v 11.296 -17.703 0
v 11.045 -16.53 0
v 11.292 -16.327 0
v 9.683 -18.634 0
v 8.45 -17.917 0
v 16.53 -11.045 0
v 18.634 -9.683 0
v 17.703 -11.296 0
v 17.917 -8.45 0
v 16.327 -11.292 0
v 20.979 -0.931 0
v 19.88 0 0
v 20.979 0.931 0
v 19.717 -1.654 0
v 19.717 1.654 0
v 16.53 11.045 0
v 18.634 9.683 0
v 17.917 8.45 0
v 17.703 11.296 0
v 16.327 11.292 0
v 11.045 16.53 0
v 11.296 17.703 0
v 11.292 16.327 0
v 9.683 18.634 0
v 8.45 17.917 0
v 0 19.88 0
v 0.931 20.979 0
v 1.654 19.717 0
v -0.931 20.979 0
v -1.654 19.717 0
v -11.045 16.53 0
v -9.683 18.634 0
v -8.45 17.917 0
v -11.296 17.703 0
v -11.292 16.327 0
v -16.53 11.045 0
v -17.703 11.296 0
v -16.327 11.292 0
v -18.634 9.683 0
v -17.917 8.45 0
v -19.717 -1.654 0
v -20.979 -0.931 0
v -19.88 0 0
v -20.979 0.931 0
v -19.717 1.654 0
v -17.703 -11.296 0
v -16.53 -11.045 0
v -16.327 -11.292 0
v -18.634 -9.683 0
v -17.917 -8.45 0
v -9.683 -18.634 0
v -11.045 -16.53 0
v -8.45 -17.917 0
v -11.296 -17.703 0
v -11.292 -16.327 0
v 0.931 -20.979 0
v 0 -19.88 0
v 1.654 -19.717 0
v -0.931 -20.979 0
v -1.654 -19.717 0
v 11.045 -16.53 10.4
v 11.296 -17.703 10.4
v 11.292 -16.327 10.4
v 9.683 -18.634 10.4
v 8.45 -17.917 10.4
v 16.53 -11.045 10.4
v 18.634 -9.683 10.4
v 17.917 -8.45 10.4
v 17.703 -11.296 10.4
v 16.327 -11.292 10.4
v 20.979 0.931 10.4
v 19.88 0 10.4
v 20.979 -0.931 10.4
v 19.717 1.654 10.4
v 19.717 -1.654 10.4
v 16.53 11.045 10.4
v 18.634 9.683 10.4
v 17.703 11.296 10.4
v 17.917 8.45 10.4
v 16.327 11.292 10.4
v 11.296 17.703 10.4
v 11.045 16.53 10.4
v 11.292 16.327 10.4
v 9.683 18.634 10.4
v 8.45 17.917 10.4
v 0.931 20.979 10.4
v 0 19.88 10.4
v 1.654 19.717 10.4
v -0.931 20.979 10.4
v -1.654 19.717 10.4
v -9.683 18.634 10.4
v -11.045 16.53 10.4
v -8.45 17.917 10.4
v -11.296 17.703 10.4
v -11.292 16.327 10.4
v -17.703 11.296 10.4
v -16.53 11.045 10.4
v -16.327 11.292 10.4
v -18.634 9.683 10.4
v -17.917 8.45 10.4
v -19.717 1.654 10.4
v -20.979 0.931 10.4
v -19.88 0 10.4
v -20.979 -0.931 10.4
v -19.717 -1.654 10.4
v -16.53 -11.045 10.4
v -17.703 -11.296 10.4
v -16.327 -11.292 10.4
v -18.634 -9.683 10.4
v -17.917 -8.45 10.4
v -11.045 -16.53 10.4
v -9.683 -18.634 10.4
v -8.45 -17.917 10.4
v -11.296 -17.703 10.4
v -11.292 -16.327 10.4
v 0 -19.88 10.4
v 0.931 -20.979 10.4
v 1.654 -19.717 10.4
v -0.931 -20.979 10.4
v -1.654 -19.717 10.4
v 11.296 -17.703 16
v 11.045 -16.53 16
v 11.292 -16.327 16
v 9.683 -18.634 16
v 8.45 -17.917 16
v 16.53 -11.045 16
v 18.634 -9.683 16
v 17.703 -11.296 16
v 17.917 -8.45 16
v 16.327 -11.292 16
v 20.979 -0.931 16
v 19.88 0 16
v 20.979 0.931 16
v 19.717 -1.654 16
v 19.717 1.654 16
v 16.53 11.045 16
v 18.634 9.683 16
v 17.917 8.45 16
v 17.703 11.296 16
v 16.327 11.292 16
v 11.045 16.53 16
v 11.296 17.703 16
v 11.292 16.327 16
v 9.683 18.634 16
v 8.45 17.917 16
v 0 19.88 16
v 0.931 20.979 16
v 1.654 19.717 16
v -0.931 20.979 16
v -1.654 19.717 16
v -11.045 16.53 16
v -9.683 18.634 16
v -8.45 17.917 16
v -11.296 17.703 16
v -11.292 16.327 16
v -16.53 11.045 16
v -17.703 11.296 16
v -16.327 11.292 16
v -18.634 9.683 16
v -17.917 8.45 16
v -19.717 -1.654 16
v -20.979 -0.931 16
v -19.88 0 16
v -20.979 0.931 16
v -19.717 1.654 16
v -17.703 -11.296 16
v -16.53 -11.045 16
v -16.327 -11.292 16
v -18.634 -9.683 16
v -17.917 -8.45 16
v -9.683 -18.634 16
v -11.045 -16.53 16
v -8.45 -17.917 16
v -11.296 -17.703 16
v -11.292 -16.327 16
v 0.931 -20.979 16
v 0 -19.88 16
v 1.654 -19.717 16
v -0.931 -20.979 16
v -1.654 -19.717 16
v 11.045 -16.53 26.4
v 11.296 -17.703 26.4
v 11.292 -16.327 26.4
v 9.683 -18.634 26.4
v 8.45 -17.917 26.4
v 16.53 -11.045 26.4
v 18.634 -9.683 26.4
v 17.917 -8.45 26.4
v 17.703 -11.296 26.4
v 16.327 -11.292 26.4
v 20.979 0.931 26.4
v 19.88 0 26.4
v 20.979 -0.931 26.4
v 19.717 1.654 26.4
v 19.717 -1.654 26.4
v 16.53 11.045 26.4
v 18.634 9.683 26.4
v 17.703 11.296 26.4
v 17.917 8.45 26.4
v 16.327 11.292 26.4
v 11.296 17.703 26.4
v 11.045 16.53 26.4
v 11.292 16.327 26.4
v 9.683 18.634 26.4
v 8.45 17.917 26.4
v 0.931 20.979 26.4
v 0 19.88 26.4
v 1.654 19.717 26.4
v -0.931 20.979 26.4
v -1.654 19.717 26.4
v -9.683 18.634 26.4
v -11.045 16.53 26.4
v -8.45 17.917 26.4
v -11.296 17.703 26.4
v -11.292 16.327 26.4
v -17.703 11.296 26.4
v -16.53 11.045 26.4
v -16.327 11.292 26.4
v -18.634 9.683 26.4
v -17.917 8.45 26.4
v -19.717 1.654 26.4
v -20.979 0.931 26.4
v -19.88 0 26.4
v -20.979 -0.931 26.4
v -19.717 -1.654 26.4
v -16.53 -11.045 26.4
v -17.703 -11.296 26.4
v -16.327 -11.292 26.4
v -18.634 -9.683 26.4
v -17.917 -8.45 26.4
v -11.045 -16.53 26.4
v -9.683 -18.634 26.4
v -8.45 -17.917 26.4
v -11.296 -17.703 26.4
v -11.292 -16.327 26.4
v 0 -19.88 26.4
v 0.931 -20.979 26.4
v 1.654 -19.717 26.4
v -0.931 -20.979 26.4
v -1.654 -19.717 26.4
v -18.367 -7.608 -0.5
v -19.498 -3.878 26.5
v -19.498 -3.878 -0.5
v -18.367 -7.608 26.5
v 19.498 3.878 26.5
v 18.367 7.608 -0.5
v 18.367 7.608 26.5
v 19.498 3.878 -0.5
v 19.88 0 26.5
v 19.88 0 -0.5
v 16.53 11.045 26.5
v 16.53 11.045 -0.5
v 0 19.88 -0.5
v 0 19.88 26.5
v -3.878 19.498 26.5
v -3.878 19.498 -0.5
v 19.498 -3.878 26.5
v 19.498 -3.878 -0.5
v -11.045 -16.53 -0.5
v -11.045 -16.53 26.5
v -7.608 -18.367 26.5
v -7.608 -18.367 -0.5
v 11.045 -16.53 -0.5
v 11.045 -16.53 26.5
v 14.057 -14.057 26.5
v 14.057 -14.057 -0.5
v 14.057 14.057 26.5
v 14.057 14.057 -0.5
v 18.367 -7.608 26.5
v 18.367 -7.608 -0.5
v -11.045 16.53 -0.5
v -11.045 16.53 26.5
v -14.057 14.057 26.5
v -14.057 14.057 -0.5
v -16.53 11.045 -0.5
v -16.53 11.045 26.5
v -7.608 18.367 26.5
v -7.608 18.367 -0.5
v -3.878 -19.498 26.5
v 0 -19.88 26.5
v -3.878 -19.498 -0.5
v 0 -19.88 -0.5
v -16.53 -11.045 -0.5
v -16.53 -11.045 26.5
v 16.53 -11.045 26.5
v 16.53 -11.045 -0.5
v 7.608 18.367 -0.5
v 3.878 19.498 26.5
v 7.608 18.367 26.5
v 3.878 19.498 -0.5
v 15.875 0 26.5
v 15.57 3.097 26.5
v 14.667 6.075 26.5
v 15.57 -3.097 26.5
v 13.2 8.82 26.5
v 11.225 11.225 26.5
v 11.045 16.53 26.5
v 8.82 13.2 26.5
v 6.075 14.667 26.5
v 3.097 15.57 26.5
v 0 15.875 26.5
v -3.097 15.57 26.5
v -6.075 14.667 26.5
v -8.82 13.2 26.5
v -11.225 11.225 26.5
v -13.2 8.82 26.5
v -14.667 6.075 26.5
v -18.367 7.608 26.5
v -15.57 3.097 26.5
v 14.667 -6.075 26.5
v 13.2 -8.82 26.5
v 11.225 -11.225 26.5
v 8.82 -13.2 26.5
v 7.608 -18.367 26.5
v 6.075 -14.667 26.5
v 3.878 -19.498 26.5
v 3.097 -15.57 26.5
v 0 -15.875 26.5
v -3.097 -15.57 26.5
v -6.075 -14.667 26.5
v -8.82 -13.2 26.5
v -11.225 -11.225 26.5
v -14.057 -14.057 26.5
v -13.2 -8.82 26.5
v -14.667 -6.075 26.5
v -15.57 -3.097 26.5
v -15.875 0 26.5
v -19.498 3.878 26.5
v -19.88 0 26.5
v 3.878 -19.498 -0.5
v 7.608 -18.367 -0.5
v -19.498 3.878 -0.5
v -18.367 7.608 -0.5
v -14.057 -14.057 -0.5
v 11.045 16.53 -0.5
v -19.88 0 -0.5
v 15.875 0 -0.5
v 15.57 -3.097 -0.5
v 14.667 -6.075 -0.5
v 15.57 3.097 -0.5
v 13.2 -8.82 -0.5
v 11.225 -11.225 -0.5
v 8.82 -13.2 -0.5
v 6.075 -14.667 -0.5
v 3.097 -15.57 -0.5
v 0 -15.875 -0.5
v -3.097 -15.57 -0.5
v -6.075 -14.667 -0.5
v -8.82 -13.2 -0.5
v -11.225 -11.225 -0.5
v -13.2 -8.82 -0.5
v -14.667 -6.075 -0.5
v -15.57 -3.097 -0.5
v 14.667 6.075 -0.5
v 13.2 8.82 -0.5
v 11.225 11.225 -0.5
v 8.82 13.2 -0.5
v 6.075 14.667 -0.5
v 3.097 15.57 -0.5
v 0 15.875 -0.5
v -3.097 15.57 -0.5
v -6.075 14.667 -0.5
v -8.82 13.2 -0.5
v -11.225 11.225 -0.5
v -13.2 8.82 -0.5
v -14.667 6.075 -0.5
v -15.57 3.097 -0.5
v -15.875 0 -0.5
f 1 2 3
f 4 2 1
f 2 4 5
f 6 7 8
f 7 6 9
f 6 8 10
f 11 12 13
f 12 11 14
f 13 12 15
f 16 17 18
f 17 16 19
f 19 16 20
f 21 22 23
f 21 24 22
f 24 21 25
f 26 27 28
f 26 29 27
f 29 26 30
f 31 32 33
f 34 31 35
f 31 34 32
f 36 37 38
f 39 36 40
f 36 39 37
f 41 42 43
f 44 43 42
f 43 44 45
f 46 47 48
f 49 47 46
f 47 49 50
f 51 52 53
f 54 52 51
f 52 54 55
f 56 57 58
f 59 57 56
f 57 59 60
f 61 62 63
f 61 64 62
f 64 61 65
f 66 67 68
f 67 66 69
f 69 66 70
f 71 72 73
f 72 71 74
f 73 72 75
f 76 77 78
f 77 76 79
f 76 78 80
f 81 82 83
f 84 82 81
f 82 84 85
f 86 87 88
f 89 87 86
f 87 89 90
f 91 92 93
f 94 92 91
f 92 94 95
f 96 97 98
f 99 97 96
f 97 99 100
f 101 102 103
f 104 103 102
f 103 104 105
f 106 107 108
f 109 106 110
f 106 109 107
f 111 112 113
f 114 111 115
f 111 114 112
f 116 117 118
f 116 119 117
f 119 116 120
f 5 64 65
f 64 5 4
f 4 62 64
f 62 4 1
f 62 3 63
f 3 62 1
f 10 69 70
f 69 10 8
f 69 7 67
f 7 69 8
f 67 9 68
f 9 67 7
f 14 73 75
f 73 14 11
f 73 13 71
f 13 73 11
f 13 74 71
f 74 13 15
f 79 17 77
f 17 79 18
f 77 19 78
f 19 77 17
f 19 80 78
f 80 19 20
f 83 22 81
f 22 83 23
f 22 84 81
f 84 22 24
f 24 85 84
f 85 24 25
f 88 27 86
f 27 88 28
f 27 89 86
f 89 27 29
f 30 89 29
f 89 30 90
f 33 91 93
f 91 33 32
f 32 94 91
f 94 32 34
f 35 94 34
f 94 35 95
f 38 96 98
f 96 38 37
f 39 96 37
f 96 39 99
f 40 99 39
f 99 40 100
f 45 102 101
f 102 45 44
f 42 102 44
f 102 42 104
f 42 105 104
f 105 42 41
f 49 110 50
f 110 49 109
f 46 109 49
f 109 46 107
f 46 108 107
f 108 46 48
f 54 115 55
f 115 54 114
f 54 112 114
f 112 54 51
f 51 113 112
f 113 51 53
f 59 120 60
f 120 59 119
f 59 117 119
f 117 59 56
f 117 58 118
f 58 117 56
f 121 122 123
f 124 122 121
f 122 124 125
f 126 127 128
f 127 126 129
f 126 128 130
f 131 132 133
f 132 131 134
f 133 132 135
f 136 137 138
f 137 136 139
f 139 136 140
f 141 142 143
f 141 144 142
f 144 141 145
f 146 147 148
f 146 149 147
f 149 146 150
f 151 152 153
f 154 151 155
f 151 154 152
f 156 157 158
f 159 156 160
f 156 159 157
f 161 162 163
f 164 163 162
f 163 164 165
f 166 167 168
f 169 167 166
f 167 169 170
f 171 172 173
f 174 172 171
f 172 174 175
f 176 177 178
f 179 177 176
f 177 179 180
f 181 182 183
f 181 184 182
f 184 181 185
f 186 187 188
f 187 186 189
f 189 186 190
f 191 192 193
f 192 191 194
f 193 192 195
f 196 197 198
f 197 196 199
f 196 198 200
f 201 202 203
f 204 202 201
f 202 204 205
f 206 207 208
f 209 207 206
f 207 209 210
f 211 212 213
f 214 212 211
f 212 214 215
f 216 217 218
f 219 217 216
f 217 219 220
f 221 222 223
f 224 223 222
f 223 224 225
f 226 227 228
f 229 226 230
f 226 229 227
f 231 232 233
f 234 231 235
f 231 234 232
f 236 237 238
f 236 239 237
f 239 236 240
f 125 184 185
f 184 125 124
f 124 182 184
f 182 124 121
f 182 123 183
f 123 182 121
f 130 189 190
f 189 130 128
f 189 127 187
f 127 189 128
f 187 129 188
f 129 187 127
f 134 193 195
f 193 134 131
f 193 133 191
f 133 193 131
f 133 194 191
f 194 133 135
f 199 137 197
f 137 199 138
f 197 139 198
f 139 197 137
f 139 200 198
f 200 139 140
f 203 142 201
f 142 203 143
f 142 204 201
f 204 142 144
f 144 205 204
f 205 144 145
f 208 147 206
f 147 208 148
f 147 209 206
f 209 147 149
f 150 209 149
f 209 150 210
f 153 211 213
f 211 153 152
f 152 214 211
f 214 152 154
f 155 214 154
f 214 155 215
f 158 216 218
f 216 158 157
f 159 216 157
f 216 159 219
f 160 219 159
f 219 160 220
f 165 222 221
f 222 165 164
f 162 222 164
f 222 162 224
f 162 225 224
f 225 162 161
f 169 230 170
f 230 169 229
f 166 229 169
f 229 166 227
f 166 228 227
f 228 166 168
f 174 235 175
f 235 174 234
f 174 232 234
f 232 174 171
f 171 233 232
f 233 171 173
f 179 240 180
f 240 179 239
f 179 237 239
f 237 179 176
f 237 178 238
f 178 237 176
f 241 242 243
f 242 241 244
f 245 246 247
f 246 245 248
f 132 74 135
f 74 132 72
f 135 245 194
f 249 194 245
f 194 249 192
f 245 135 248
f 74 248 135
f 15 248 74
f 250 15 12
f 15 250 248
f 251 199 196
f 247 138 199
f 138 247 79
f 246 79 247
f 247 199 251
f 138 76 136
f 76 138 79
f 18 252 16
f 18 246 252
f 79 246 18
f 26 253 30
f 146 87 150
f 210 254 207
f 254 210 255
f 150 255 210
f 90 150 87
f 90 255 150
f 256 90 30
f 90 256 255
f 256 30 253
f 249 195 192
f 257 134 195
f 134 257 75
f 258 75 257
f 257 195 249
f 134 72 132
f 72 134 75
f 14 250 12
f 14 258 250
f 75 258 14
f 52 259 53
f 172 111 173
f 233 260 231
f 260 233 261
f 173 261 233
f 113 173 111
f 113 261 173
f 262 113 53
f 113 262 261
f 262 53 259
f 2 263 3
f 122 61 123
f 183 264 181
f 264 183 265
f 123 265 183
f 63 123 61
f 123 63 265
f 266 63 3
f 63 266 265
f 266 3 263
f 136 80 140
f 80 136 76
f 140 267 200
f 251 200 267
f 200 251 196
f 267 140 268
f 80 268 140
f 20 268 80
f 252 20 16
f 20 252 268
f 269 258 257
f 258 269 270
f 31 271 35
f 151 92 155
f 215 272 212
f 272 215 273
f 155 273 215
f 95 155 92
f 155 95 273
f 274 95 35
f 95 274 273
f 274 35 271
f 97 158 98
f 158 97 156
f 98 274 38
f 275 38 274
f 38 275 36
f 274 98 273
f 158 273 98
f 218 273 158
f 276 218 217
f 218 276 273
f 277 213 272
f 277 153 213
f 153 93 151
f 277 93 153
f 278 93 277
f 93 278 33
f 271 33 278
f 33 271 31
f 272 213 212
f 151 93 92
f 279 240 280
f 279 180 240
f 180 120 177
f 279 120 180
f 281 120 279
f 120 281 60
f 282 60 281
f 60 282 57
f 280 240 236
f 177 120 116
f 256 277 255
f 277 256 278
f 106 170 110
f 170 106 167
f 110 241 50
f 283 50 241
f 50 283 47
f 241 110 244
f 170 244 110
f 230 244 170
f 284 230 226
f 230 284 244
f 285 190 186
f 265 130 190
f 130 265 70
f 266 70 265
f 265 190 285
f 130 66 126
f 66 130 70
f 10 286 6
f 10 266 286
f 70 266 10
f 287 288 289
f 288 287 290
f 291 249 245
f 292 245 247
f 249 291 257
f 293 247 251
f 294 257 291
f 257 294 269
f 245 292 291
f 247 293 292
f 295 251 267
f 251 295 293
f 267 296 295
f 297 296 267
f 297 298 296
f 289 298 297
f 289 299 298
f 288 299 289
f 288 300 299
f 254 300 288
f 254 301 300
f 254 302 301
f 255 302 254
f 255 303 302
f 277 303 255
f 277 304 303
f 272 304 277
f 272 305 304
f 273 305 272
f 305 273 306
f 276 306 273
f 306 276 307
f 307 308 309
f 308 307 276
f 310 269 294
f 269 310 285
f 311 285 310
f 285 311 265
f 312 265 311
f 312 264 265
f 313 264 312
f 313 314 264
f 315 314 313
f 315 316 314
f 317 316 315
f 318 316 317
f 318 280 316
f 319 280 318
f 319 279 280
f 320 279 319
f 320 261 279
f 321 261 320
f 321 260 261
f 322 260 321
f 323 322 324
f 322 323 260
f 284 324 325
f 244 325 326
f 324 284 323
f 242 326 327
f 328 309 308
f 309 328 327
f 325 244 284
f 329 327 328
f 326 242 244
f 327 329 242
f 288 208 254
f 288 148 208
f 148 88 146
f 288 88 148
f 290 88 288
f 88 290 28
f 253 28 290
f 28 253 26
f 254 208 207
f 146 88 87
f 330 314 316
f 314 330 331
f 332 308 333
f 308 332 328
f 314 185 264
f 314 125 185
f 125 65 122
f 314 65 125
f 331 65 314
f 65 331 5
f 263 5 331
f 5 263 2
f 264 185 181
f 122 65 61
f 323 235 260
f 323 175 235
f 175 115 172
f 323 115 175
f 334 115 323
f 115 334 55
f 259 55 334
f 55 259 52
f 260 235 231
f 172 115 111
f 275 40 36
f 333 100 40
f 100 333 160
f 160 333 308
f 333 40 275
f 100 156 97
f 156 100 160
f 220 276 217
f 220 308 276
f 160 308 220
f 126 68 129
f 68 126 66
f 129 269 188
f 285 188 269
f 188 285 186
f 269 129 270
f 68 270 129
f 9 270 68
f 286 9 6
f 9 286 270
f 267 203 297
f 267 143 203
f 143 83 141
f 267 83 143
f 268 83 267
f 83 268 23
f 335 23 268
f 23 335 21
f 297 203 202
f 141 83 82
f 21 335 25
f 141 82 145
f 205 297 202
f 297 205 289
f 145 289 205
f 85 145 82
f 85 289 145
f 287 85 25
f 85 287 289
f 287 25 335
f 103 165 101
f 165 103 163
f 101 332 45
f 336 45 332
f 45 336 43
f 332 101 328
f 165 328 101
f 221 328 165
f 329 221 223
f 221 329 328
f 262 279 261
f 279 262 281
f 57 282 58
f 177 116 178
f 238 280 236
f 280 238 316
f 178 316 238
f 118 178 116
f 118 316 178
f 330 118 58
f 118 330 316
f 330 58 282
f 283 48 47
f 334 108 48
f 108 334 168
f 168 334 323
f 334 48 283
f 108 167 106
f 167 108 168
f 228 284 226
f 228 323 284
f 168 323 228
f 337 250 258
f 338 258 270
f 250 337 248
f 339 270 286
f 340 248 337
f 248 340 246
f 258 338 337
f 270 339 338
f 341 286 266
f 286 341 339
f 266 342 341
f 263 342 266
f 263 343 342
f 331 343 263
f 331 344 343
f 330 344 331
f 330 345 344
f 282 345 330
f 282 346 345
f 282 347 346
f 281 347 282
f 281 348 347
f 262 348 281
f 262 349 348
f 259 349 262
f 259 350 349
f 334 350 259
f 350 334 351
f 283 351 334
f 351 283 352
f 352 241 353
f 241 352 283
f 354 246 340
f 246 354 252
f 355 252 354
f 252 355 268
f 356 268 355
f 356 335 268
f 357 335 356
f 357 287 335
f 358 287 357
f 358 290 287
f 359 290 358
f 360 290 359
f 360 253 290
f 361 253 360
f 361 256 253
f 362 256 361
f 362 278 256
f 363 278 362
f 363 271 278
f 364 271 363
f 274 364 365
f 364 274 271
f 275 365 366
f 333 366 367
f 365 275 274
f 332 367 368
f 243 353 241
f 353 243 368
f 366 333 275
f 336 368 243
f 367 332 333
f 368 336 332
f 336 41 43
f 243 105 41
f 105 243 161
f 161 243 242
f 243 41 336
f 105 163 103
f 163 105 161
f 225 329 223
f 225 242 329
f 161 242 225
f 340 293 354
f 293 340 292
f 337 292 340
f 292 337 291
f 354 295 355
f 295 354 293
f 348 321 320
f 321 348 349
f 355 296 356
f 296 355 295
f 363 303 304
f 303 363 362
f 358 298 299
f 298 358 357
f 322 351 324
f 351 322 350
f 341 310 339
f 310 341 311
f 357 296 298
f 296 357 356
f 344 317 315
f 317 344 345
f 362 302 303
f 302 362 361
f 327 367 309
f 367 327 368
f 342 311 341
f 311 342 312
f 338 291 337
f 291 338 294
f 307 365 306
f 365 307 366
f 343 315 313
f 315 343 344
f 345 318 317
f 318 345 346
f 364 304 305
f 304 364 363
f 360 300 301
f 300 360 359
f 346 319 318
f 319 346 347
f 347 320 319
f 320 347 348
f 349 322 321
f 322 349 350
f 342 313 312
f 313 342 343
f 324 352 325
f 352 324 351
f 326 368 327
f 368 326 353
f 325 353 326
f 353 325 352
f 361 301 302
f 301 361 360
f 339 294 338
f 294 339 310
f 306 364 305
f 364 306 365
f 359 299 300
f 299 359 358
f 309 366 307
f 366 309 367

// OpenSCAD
$fn = 32;

// ----------------------------------------------------------------------
// Two-module gear rim: z12 m3 and z12 m3, 26 mm wide
// ----------------------------------------------------------------------

// --- parameters (mm) ---
module_a = 3;             // first tooth module
teeth_a = 12;             // first band tooth count
module_b = 3;             // second tooth module
teeth_b = 12;             // second band tooth count
band_h = 10;              // height of one tooth band
web_t = 6;                // web thickness between the bands
total = 26;               // overall width over both bands
root_r = 14.25;           // root radius of the coarse band
hub_r = 19.88;            // hub radius
bore_d = 31.75;           // hub bore
hole_count = 4;           // lightening holes
hole_r = 11.62;           // lightening hole circle radius
hole_d = 4;               // lightening hole diameter

band_a = [[14.099, -2.068], [18.168, -2.269], [19.578, -1.734], [20.979, -0.931], [20.979, 0.931], [19.578, 1.734], [18.168, 2.269], [14.099, 2.068], [13.244, 5.258], [16.869, 7.119], [17.822, 8.287], [18.634, 9.683], [17.703, 11.296], [16.088, 11.291], [14.6, 11.049], [11.176, 8.841], [8.841, 11.176], [11.049, 14.6], [11.291, 16.088], [11.296, 17.703], [9.683, 18.634], [8.287, 17.822], [7.119, 16.869], [5.258, 13.244], [2.068, 14.099], [2.269, 18.168], [1.734, 19.578], [0.931, 20.979], [-0.931, 20.979], [-1.734, 19.578], [-2.269, 18.168], [-2.068, 14.099], [-5.258, 13.244], [-7.119, 16.869], [-8.287, 17.822], [-9.683, 18.634], [-11.296, 17.703], [-11.291, 16.088], [-11.049, 14.6], [-8.841, 11.176], [-11.176, 8.841], [-14.6, 11.049], [-16.088, 11.291], [-17.703, 11.296], [-18.634, 9.683], [-17.822, 8.287], [-16.869, 7.119], [-13.244, 5.258], [-14.099, 2.068], [-18.168, 2.269], [-19.578, 1.734], [-20.979, 0.931], [-20.979, -0.931], [-19.578, -1.734], [-18.168, -2.269], [-14.099, -2.068], [-13.244, -5.258], [-16.869, -7.119], [-17.822, -8.287], [-18.634, -9.683], [-17.703, -11.296], [-16.088, -11.291], [-14.6, -11.049], [-11.176, -8.841], [-8.841, -11.176], [-11.049, -14.6], [-11.291, -16.088], [-11.296, -17.703], [-9.683, -18.634], [-8.287, -17.822], [-7.119, -16.869], [-5.258, -13.244], [-2.068, -14.099], [-2.269, -18.168], [-1.734, -19.578], [-0.931, -20.979], [0.931, -20.979], [1.734, -19.578], [2.269, -18.168], [2.068, -14.099], [5.258, -13.244], [7.119, -16.869], [8.287, -17.822], [9.683, -18.634], [11.296, -17.703], [11.291, -16.088], [11.049, -14.6], [8.841, -11.176], [11.176, -8.841], [14.6, -11.049], [16.088, -11.291], [17.703, -11.296], [18.634, -9.683], [17.822, -8.287], [16.869, -7.119], [13.244, -5.258]];
band_b = [[14.099, -2.068], [18.168, -2.269], [19.578, -1.734], [20.979, -0.931], [20.979, 0.931], [19.578, 1.734], [18.168, 2.269], [14.099, 2.068], [13.244, 5.258], [16.869, 7.119], [17.822, 8.287], [18.634, 9.683], [17.703, 11.296], [16.088, 11.291], [14.6, 11.049], [11.176, 8.841], [8.841, 11.176], [11.049, 14.6], [11.291, 16.088], [11.296, 17.703], [9.683, 18.634], [8.287, 17.822], [7.119, 16.869], [5.258, 13.244], [2.068, 14.099], [2.269, 18.168], [1.734, 19.578], [0.931, 20.979], [-0.931, 20.979], [-1.734, 19.578], [-2.269, 18.168], [-2.068, 14.099], [-5.258, 13.244], [-7.119, 16.869], [-8.287, 17.822], [-9.683, 18.634], [-11.296, 17.703], [-11.291, 16.088], [-11.049, 14.6], [-8.841, 11.176], [-11.176, 8.841], [-14.6, 11.049], [-16.088, 11.291], [-17.703, 11.296], [-18.634, 9.683], [-17.822, 8.287], [-16.869, 7.119], [-13.244, 5.258], [-14.099, 2.068], [-18.168, 2.269], [-19.578, 1.734], [-20.979, 0.931], [-20.979, -0.931], [-19.578, -1.734], [-18.168, -2.269], [-14.099, -2.068], [-13.244, -5.258], [-16.869, -7.119], [-17.822, -8.287], [-18.634, -9.683], [-17.703, -11.296], [-16.088, -11.291], [-14.6, -11.049], [-11.176, -8.841], [-8.841, -11.176], [-11.049, -14.6], [-11.291, -16.088], [-11.296, -17.703], [-9.683, -18.634], [-8.287, -17.822], [-7.119, -16.869], [-5.258, -13.244], [-2.068, -14.099], [-2.269, -18.168], [-1.734, -19.578], [-0.931, -20.979], [0.931, -20.979], [1.734, -19.578], [2.269, -18.168], [2.068, -14.099], [5.258, -13.244], [7.119, -16.869], [8.287, -17.822], [9.683, -18.634], [11.296, -17.703], [11.291, -16.088], [11.049, -14.6], [8.841, -11.176], [11.176, -8.841], [14.6, -11.049], [16.088, -11.291], [17.703, -11.296], [18.634, -9.683], [17.822, -8.287], [16.869, -7.119], [13.244, -5.258]];

difference() {
  union() {
    /* tooth band A, overlapping the web by 0.4 mm */
    linear_extrude(height = band_h + 0.4) polygon(band_a);
    /* web */
    translate([0, 0, band_h - 0.4]) cylinder(h = web_t + 0.8, d = 2 * root_r);
    /* tooth band B */
    translate([0, 0, band_h + web_t]) linear_extrude(height = band_h + 0.4) polygon(band_b);
    /* hub */
    translate([0, 0, -0.5]) cylinder(h = total + 1.0, d = 2 * hub_r);
  }
  /* bore */
  translate([0, 0, -2.5]) cylinder(h = total + 5, d = bore_d);
  /* lightening holes through the web */
  for (i = [0 : hole_count - 1]) {
    a = i * 360 / hole_count;
    translate([hole_r * cos(a), hole_r * sin(a), -2.5]) cylinder(h = total + 5, d = hole_d);
  }
}
